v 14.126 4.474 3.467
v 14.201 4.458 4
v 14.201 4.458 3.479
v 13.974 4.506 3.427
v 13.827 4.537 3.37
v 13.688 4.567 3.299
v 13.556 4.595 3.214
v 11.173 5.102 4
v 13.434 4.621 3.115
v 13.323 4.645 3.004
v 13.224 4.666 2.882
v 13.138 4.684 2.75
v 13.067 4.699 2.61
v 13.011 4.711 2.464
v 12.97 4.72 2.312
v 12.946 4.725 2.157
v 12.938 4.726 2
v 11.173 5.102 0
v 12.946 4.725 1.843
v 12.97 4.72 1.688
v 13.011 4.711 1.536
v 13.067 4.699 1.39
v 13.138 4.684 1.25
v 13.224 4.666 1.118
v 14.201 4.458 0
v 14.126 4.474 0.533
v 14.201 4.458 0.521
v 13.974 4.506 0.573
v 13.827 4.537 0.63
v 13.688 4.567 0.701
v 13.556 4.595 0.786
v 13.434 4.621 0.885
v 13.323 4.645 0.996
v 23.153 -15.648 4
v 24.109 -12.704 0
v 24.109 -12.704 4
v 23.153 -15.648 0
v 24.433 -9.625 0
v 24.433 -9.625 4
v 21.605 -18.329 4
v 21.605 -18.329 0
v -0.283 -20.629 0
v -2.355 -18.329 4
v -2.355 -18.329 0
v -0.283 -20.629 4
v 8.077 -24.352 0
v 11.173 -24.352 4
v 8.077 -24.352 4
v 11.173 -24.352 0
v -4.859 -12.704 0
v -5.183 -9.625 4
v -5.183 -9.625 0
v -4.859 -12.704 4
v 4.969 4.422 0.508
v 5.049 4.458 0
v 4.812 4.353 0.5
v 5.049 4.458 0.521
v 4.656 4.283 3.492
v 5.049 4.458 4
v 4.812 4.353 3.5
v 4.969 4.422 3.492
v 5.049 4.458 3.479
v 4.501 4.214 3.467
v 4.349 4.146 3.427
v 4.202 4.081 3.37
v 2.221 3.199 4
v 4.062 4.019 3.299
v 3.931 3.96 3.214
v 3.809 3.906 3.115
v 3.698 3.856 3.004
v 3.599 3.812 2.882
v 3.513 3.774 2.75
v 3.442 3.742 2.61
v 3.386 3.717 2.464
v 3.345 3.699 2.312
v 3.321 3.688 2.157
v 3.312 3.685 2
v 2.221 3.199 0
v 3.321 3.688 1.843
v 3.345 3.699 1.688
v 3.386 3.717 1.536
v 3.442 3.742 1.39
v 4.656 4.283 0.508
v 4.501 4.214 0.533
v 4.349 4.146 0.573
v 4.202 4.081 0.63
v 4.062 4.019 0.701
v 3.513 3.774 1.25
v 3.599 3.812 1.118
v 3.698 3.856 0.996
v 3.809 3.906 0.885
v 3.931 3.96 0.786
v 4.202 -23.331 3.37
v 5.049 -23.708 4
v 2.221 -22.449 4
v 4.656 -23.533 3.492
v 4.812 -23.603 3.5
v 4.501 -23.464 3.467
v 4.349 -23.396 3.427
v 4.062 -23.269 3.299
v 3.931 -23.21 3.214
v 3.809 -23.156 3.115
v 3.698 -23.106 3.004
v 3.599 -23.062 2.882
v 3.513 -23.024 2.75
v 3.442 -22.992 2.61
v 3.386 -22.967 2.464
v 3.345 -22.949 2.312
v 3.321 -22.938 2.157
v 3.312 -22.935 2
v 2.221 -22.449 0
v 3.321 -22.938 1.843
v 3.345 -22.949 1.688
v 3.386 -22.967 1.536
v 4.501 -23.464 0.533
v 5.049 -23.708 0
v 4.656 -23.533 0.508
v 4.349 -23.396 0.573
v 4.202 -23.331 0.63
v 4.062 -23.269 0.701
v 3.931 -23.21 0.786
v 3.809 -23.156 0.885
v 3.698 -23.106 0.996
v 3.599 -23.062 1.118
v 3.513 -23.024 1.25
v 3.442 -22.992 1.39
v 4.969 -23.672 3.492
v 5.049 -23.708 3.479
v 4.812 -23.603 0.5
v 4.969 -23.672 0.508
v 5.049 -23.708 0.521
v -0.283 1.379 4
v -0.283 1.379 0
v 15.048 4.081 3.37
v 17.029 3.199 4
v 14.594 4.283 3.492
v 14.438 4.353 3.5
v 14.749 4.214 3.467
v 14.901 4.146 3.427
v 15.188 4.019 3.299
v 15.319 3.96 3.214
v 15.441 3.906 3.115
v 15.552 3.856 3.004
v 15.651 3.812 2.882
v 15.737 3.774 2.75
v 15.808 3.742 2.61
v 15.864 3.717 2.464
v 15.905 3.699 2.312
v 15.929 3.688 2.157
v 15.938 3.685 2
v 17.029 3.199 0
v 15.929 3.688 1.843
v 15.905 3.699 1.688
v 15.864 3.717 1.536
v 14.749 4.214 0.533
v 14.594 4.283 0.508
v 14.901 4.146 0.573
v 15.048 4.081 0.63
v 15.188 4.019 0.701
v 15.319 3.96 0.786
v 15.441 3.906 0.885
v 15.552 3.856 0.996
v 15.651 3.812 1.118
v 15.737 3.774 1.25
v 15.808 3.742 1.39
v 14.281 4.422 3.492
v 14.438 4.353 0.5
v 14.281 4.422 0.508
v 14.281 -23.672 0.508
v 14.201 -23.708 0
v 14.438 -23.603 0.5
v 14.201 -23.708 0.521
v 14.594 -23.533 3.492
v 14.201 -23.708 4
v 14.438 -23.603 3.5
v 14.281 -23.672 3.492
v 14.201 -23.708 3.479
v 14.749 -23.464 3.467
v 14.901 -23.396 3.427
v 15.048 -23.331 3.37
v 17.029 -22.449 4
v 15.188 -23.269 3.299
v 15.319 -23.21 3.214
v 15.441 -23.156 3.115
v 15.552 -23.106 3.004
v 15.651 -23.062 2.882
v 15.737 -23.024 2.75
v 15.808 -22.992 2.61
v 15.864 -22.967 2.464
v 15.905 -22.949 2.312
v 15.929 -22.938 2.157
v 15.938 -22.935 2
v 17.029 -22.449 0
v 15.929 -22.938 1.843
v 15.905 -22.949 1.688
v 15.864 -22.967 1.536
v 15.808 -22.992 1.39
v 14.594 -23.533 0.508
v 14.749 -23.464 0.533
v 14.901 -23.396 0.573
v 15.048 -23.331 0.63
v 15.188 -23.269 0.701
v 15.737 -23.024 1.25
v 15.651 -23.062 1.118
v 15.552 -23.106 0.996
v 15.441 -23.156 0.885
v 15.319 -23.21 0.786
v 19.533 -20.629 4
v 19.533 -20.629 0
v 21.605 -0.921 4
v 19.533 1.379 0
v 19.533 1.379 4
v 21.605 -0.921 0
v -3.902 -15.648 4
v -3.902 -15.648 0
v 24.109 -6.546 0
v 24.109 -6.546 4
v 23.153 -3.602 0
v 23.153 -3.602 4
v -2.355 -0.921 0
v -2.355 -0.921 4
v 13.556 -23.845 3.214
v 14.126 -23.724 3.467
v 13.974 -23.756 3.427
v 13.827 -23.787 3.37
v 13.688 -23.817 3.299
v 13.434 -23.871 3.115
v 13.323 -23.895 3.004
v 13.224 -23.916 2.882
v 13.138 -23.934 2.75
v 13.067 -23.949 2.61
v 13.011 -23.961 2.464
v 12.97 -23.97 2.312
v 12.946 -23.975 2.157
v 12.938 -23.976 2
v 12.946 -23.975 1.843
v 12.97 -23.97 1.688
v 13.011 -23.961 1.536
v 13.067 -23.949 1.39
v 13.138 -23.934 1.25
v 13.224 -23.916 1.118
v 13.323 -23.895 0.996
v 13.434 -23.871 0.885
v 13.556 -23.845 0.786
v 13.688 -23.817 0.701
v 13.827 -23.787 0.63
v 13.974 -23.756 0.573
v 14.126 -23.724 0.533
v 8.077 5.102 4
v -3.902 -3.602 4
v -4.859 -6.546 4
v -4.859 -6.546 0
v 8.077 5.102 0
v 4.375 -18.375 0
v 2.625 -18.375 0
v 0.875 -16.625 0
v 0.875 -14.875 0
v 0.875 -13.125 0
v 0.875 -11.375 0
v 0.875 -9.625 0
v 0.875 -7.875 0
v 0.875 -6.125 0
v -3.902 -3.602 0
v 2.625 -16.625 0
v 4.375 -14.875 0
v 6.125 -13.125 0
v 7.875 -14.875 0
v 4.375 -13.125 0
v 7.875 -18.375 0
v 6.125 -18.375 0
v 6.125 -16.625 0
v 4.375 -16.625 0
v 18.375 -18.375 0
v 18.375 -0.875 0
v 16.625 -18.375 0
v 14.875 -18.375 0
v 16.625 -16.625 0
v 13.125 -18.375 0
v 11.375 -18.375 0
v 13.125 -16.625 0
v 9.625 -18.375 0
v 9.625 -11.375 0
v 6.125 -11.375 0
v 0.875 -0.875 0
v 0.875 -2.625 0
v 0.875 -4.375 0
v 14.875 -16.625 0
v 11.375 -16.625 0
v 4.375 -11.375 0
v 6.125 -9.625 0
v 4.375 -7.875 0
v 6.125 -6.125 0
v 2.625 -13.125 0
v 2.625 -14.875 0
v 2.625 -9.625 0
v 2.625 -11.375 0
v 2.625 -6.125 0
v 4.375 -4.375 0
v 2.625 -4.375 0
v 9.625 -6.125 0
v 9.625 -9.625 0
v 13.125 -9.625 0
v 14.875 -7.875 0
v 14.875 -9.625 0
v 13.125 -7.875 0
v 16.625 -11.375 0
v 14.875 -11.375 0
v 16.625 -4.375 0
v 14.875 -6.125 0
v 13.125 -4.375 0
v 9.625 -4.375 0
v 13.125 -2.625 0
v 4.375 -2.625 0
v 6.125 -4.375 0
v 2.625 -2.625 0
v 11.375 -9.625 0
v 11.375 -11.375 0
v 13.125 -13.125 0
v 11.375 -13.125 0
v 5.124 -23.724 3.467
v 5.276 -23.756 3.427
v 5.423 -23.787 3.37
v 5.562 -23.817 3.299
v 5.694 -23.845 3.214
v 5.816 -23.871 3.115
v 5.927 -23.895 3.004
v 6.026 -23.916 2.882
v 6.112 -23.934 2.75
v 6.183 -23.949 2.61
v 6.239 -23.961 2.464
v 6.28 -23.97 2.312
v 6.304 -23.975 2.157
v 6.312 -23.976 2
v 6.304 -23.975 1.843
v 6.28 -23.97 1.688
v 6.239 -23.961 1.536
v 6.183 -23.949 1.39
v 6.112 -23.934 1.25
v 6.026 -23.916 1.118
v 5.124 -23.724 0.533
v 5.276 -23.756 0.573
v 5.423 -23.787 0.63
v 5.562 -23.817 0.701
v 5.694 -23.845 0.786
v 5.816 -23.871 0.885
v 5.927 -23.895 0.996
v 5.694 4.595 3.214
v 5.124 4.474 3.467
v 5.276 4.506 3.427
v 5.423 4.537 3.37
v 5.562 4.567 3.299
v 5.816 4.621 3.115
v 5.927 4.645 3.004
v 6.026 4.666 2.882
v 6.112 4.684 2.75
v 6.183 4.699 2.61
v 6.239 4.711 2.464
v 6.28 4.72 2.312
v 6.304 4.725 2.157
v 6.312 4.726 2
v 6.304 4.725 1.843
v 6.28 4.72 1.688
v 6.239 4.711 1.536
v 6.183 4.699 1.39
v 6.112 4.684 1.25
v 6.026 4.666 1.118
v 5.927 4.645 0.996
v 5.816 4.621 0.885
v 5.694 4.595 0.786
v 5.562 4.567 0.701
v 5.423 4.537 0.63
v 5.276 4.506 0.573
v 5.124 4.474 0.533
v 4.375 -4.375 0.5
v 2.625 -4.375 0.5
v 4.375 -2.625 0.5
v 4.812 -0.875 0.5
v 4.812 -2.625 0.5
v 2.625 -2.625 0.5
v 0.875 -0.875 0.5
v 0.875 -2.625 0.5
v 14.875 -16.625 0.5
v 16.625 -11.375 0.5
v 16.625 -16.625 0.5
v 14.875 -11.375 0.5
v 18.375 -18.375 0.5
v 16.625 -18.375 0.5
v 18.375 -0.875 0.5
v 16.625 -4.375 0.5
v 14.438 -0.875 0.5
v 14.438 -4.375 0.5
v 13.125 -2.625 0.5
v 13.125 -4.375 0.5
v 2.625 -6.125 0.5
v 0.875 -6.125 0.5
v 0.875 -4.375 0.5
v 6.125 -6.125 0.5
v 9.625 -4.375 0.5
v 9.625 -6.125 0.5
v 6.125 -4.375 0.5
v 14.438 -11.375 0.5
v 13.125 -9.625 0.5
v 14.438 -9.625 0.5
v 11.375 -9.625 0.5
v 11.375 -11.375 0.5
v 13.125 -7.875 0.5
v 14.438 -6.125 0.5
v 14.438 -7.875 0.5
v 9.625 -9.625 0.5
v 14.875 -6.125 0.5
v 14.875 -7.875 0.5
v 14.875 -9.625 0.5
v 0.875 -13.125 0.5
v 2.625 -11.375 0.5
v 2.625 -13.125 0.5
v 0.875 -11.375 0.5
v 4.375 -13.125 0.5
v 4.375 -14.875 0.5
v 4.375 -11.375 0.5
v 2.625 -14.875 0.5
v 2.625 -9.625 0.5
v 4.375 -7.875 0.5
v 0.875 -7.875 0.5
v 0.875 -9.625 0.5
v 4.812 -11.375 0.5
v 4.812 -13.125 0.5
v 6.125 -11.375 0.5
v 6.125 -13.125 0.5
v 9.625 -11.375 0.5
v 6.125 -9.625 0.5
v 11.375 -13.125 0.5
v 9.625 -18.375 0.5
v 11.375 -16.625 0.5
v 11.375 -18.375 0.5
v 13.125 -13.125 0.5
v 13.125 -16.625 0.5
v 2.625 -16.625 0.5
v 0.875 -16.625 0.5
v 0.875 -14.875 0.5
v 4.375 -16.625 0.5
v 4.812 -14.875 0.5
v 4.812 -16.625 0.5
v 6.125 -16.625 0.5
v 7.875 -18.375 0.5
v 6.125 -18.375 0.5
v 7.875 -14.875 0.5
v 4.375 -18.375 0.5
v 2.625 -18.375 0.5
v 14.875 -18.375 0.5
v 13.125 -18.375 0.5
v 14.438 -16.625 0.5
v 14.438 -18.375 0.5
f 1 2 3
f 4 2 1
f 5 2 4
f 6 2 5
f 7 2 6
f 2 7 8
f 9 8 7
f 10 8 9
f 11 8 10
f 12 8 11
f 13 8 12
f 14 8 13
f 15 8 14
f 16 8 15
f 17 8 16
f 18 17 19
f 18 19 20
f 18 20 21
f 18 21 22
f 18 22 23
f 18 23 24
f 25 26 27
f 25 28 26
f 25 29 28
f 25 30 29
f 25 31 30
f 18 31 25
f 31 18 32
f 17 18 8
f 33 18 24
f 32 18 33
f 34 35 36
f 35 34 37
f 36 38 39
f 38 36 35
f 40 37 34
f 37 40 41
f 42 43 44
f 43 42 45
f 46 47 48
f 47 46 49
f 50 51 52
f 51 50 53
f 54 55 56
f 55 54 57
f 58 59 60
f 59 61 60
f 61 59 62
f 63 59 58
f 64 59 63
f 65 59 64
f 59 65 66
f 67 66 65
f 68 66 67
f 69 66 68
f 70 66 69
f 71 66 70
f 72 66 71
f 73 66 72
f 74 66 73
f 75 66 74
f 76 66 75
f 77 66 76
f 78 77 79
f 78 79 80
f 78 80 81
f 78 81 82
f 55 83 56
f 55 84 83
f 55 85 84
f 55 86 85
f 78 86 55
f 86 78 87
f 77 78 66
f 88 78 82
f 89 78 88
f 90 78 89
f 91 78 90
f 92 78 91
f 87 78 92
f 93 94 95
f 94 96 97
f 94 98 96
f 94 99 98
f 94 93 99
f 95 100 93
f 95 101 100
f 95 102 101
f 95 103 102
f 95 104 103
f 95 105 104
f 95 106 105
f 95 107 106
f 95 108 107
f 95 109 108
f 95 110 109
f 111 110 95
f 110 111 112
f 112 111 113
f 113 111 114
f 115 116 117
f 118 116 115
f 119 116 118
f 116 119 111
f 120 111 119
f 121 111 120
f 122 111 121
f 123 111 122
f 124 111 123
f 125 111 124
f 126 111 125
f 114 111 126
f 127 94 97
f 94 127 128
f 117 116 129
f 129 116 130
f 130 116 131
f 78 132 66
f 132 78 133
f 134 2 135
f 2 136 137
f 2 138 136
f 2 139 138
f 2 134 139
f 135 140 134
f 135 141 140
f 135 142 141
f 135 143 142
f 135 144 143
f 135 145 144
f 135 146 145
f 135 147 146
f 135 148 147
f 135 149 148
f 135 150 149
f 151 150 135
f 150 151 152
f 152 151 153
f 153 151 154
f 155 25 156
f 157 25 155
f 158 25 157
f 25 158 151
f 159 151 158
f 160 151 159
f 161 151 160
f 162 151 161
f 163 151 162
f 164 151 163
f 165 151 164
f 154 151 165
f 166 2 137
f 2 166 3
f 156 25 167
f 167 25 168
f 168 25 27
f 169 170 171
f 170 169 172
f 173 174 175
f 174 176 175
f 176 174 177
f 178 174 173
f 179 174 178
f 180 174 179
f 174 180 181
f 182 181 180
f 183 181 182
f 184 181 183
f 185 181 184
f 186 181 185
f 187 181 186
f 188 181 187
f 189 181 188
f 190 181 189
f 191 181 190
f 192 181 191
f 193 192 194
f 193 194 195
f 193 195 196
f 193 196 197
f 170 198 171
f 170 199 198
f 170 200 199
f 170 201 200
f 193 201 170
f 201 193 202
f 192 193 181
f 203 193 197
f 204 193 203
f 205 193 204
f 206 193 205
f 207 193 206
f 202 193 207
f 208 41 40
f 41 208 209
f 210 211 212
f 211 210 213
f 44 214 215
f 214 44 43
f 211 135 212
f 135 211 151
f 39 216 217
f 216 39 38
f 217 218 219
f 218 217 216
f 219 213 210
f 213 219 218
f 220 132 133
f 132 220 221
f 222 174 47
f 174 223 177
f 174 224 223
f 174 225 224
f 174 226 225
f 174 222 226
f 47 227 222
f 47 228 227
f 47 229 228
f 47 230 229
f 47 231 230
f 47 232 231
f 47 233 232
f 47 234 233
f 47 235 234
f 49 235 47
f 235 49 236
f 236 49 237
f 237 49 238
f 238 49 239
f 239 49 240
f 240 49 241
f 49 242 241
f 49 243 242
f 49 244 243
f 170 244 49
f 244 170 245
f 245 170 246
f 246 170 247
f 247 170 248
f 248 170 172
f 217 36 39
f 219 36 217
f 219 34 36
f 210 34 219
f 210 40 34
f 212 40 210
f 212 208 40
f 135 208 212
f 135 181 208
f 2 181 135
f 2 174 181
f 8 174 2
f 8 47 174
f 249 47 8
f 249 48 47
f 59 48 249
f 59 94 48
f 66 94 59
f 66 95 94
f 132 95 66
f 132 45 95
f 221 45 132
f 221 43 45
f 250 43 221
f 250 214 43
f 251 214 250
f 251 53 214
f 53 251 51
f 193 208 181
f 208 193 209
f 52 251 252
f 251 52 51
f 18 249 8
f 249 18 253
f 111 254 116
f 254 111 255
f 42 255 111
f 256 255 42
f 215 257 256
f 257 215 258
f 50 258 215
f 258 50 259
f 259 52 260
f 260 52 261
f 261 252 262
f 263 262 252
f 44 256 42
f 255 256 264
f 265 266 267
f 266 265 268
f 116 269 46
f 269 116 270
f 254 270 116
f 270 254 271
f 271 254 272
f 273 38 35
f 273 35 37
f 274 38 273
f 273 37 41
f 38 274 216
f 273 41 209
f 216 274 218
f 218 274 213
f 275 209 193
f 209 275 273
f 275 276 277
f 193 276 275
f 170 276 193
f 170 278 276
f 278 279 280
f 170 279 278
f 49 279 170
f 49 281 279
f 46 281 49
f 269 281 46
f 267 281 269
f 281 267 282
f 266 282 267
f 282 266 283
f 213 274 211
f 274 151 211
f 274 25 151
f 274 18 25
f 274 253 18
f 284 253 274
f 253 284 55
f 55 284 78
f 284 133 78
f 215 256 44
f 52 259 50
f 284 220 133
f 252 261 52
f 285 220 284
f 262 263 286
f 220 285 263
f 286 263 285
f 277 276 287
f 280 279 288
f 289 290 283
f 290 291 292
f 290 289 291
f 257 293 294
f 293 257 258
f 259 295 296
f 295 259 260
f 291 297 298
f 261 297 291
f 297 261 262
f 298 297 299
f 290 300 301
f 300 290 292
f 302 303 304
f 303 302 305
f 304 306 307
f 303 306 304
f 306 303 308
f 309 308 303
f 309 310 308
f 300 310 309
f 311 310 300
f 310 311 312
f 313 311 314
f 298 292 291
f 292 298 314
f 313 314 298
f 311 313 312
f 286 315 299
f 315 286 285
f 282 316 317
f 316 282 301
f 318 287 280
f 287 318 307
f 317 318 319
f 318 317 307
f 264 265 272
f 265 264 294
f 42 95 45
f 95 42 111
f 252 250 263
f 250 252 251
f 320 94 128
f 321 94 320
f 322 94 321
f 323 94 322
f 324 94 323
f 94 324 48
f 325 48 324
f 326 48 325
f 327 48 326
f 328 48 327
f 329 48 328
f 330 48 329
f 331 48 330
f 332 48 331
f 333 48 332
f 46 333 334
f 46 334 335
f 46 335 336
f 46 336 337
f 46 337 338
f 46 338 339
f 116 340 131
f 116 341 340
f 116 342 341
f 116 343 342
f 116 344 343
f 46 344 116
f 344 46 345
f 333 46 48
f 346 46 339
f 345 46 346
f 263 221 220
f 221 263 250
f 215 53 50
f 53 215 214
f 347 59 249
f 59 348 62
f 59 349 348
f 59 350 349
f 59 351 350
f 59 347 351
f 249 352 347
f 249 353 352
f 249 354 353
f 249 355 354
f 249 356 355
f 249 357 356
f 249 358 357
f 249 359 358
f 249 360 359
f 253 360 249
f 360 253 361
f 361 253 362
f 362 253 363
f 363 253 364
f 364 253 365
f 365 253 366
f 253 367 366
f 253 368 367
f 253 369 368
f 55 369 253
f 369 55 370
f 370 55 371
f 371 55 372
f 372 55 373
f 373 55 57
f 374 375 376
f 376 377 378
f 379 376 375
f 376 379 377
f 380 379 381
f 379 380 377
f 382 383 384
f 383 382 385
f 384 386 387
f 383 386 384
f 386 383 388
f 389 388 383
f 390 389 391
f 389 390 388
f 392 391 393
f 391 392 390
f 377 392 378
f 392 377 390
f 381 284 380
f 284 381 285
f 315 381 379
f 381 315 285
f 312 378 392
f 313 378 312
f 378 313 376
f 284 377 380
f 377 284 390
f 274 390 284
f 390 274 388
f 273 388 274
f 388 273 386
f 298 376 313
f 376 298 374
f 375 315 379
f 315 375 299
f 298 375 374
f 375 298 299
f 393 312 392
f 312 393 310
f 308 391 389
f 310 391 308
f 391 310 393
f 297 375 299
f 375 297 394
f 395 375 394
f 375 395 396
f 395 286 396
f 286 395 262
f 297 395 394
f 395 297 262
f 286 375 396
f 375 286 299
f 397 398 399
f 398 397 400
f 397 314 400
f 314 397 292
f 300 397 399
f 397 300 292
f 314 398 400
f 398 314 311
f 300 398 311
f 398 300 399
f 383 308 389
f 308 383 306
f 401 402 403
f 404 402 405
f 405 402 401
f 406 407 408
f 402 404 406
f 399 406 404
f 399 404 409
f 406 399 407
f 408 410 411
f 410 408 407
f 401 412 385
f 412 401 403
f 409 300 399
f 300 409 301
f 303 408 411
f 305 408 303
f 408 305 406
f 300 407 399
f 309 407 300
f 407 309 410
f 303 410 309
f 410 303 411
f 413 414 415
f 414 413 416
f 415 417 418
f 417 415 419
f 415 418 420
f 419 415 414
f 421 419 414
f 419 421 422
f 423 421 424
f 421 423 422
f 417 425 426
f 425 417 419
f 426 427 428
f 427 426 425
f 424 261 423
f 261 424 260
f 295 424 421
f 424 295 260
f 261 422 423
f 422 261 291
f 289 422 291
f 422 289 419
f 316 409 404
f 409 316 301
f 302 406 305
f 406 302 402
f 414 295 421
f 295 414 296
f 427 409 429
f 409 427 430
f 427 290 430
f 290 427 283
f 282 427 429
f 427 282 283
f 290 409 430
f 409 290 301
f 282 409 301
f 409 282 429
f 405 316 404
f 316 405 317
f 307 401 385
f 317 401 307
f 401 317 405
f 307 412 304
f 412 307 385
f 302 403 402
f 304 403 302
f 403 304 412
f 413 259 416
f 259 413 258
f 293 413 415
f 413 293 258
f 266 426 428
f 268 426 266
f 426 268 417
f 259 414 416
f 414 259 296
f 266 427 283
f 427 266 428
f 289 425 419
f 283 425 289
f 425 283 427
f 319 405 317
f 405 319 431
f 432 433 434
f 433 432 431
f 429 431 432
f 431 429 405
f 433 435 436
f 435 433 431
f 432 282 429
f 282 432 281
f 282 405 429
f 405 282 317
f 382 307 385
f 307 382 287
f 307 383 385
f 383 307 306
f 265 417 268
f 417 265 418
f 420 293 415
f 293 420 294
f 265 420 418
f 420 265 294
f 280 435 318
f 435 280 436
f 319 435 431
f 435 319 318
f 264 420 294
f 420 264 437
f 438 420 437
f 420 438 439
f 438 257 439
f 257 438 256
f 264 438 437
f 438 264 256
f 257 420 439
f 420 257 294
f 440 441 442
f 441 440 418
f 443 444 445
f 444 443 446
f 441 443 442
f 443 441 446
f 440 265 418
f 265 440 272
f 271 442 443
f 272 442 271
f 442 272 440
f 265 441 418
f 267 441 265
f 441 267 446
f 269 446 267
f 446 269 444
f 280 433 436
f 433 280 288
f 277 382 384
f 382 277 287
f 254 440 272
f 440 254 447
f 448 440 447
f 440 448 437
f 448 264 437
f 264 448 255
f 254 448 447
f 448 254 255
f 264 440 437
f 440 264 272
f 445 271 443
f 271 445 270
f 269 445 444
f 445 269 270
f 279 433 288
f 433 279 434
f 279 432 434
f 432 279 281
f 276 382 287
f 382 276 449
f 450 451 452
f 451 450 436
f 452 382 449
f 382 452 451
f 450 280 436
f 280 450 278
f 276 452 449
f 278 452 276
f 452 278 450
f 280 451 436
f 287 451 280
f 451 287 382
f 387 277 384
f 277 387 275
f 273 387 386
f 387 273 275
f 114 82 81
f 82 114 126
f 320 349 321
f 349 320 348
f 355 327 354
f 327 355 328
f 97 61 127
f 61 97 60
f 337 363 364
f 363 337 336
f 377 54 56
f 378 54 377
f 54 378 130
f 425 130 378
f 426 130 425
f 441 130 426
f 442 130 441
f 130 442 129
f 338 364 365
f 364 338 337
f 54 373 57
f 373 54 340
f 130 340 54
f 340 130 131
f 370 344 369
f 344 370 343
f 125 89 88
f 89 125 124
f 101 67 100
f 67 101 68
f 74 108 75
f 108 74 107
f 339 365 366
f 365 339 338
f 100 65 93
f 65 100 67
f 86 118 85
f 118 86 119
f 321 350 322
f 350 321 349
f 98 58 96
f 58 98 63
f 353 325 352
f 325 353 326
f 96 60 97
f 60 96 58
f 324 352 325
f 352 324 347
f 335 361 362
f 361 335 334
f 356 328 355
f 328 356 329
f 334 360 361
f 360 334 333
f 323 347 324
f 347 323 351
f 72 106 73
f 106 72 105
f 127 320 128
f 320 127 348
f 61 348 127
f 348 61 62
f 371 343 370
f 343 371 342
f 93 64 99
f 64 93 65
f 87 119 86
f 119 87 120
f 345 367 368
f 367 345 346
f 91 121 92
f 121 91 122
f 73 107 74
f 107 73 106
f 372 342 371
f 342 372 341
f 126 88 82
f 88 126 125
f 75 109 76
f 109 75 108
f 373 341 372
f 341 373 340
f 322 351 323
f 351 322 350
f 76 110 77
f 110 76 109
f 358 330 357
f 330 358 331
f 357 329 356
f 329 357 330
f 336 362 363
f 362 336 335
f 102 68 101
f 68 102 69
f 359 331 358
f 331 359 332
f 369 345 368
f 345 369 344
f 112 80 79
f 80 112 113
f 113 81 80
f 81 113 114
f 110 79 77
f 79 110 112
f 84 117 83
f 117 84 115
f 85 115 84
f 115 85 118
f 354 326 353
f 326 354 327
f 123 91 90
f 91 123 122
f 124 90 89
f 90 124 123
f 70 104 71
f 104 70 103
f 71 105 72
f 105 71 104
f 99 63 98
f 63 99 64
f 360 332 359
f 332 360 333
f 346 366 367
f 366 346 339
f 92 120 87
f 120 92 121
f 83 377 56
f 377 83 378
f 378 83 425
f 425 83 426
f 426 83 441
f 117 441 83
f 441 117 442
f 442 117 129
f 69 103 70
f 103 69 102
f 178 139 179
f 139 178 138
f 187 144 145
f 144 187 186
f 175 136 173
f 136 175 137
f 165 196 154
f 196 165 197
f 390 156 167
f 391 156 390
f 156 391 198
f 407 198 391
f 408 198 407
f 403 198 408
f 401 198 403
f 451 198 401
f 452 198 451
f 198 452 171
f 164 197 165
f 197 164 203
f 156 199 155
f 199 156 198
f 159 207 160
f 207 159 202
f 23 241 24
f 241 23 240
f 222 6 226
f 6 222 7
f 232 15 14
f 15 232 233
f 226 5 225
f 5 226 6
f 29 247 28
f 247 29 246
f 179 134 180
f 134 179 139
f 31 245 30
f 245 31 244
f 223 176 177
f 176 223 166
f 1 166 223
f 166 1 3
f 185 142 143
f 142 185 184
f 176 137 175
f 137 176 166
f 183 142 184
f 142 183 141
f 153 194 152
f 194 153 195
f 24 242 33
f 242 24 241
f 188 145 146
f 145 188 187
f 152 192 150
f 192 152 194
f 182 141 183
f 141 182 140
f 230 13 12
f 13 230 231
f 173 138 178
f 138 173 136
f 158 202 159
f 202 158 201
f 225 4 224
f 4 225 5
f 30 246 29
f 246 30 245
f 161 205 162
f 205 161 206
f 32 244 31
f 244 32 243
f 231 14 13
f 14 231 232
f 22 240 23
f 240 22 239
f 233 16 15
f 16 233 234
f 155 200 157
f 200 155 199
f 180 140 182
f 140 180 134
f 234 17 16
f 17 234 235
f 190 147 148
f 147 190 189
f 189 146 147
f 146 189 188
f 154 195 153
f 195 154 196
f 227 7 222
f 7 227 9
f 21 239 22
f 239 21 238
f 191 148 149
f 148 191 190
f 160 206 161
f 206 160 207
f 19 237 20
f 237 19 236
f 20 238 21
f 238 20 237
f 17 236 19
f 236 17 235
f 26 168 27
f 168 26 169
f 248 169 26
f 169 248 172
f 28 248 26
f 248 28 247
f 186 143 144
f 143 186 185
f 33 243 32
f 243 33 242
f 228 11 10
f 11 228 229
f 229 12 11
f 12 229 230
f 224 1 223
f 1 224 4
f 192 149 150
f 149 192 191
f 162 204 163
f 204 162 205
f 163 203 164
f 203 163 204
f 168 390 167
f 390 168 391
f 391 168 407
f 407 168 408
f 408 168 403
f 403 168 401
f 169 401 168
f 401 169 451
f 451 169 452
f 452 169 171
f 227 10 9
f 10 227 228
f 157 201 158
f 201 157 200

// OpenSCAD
rotate([180,0,0])difference(){translate([9.625,9.625,-2])  cylinder(r=14.8076923076923,h=4, center=true);
translate([1.75,1.75,0])  cube(size = [1.75,1.75,1], center=true);
translate([3.5,1.75,0])  cube(size = [1.75,1.75,1], center=true);
translate([5.25,1.75,0])  cube(size = [1.75,1.75,1], center=true);
translate([7,1.75,0])  cube(size = [1.75,1.75,1], center=true);
translate([8.75,1.75,0])  cube(size = [1.75,1.75,1], center=true);
translate([10.5,1.75,0])  cube(size = [1.75,1.75,1], center=true);
translate([12.25,1.75,0])  cube(size = [1.75,1.75,1], center=true);
translate([14,1.75,0])  cube(size = [1.75,1.75,1], center=true);
translate([15.75,1.75,0])  cube(size = [1.75,1.75,1], center=true);
translate([17.5,1.75,0])  cube(size = [1.75,1.75,1], center=true);
translate([17.5,1.75,0])  cube(size = [1.75,1.75,1], center=true);
translate([3.5,3.5,0])  cube(size = [1.75,1.75,1], center=true);
translate([3.5,3.5,0])  cube(size = [1.75,1.75,1], center=true);
translate([3.5,3.5,0])  cube(size = [1.75,1.75,1], center=true);
translate([3.5,3.5,0])  cube(size = [1.75,1.75,1], center=true);
translate([3.5,3.5,0])  cube(size = [1.75,1.75,1], center=true);
translate([3.5,3.5,0])  cube(size = [1.75,1.75,1], center=true);
translate([14,3.5,0])  cube(size = [1.75,1.75,1], center=true);
translate([15.75,3.5,0])  cube(size = [1.75,1.75,1], center=true);
translate([17.5,3.5,0])  cube(size = [1.75,1.75,1], center=true);
translate([1.75,5.25,0])  cube(size = [1.75,1.75,1], center=true);
translate([1.75,5.25,0])  cube(size = [1.75,1.75,1], center=true);
translate([1.75,5.25,0])  cube(size = [1.75,1.75,1], center=true);
translate([7,5.25,0])  cube(size = [1.75,1.75,1], center=true);
translate([8.75,5.25,0])  cube(size = [1.75,1.75,1], center=true);
translate([8.75,5.25,0])  cube(size = [1.75,1.75,1], center=true);
translate([8.75,5.25,0])  cube(size = [1.75,1.75,1], center=true);
translate([8.75,5.25,0])  cube(size = [1.75,1.75,1], center=true);
translate([8.75,5.25,0])  cube(size = [1.75,1.75,1], center=true);
translate([17.5,5.25,0])  cube(size = [1.75,1.75,1], center=true);
translate([17.5,5.25,0])  cube(size = [1.75,1.75,1], center=true);
translate([17.5,5.25,0])  cube(size = [1.75,1.75,1], center=true);
translate([17.5,5.25,0])  cube(size = [1.75,1.75,1], center=true);
translate([17.5,5.25,0])  cube(size = [1.75,1.75,1], center=true);
translate([17.5,5.25,0])  cube(size = [1.75,1.75,1], center=true);
translate([10.5,7,0])  cube(size = [1.75,1.75,1], center=true);
translate([12.25,7,0])  cube(size = [1.75,1.75,1], center=true);
translate([14,7,0])  cube(size = [1.75,1.75,1], center=true);
translate([14,7,0])  cube(size = [1.75,1.75,1], center=true);
translate([17.5,7,0])  cube(size = [1.75,1.75,1], center=true);
translate([1.75,8.75,0])  cube(size = [1.75,1.75,1], center=true);
translate([3.5,8.75,0])  cube(size = [1.75,1.75,1], center=true);
translate([3.5,8.75,0])  cube(size = [1.75,1.75,1], center=true);
translate([3.5,8.75,0])  cube(size = [1.75,1.75,1], center=true);
translate([3.5,8.75,0])  cube(size = [1.75,1.75,1], center=true);
translate([10.5,8.75,0])  cube(size = [1.75,1.75,1], center=true);
translate([12.25,8.75,0])  cube(size = [1.75,1.75,1], center=true);
translate([12.25,8.75,0])  cube(size = [1.75,1.75,1], center=true);
translate([12.25,8.75,0])  cube(size = [1.75,1.75,1], center=true);
translate([17.5,8.75,0])  cube(size = [1.75,1.75,1], center=true);
translate([17.5,8.75,0])  cube(size = [1.75,1.75,1], center=true);
translate([3.5,10.5,0])  cube(size = [1.75,1.75,1], center=true);
translate([3.5,10.5,0])  cube(size = [1.75,1.75,1], center=true);
translate([7,10.5,0])  cube(size = [1.75,1.75,1], center=true);
translate([8.75,10.5,0])  cube(size = [1.75,1.75,1], center=true);
translate([8.75,10.5,0])  cube(size = [1.75,1.75,1], center=true);
translate([12.25,10.5,0])  cube(size = [1.75,1.75,1], center=true);
translate([14,10.5,0])  cube(size = [1.75,1.75,1], center=true);
translate([14,10.5,0])  cube(size = [1.75,1.75,1], center=true);
translate([17.5,10.5,0])  cube(size = [1.75,1.75,1], center=true);
translate([1.75,12.25,0])  cube(size = [1.75,1.75,1], center=true);
translate([3.5,12.25,0])  cube(size = [1.75,1.75,1], center=true);
translate([5.25,12.25,0])  cube(size = [1.75,1.75,1], center=true);
translate([5.25,12.25,0])  cube(size = [1.75,1.75,1], center=true);
translate([5.25,12.25,0])  cube(size = [1.75,1.75,1], center=true);
translate([10.5,12.25,0])  cube(size = [1.75,1.75,1], center=true);
translate([10.5,12.25,0])  cube(size = [1.75,1.75,1], center=true);
translate([10.5,12.25,0])  cube(size = [1.75,1.75,1], center=true);
translate([15.75,12.25,0])  cube(size = [1.75,1.75,1], center=true);
translate([17.5,12.25,0])  cube(size = [1.75,1.75,1], center=true);
translate([17.5,12.25,0])  cube(size = [1.75,1.75,1], center=true);
translate([3.5,14,0])  cube(size = [1.75,1.75,1], center=true);
translate([3.5,14,0])  cube(size = [1.75,1.75,1], center=true);
translate([3.5,14,0])  cube(size = [1.75,1.75,1], center=true);
translate([3.5,14,0])  cube(size = [1.75,1.75,1], center=true);
translate([10.5,14,0])  cube(size = [1.75,1.75,1], center=true);
translate([12.25,14,0])  cube(size = [1.75,1.75,1], center=true);
translate([12.25,14,0])  cube(size = [1.75,1.75,1], center=true);
translate([15.75,14,0])  cube(size = [1.75,1.75,1], center=true);
translate([17.5,14,0])  cube(size = [1.75,1.75,1], center=true);
translate([1.75,15.75,0])  cube(size = [1.75,1.75,1], center=true);
translate([1.75,15.75,0])  cube(size = [1.75,1.75,1], center=true);
translate([5.25,15.75,0])  cube(size = [1.75,1.75,1], center=true);
translate([7,15.75,0])  cube(size = [1.75,1.75,1], center=true);
translate([7,15.75,0])  cube(size = [1.75,1.75,1], center=true);
translate([10.5,15.75,0])  cube(size = [1.75,1.75,1], center=true);
translate([12.25,15.75,0])  cube(size = [1.75,1.75,1], center=true);
translate([12.25,15.75,0])  cube(size = [1.75,1.75,1], center=true);
translate([15.75,15.75,0])  cube(size = [1.75,1.75,1], center=true);
translate([17.5,15.75,0])  cube(size = [1.75,1.75,1], center=true);
translate([17.5,15.75,0])  cube(size = [1.75,1.75,1], center=true);
translate([3.5,17.5,0])  cube(size = [1.75,1.75,1], center=true);
translate([3.5,17.5,0])  cube(size = [1.75,1.75,1], center=true);
translate([7,17.5,0])  cube(size = [1.75,1.75,1], center=true);
translate([7,17.5,0])  cube(size = [1.75,1.75,1], center=true);
translate([10.5,17.5,0])  cube(size = [1.75,1.75,1], center=true);
translate([10.5,17.5,0])  cube(size = [1.75,1.75,1], center=true);
translate([14,17.5,0])  cube(size = [1.75,1.75,1], center=true);
translate([14,17.5,0])  cube(size = [1.75,1.75,1], center=true);
translate([17.5,17.5,0])  cube(size = [1.75,1.75,1], center=true);
rotate([90,90,0])translate([2,4.8125,0])  cylinder(r=1.5,h=400, $fn=60, center=true);
rotate([90,90,0])translate([2,14.4375,0])  cylinder(r=1.5,h=400, $fn=60, center=true);
}
